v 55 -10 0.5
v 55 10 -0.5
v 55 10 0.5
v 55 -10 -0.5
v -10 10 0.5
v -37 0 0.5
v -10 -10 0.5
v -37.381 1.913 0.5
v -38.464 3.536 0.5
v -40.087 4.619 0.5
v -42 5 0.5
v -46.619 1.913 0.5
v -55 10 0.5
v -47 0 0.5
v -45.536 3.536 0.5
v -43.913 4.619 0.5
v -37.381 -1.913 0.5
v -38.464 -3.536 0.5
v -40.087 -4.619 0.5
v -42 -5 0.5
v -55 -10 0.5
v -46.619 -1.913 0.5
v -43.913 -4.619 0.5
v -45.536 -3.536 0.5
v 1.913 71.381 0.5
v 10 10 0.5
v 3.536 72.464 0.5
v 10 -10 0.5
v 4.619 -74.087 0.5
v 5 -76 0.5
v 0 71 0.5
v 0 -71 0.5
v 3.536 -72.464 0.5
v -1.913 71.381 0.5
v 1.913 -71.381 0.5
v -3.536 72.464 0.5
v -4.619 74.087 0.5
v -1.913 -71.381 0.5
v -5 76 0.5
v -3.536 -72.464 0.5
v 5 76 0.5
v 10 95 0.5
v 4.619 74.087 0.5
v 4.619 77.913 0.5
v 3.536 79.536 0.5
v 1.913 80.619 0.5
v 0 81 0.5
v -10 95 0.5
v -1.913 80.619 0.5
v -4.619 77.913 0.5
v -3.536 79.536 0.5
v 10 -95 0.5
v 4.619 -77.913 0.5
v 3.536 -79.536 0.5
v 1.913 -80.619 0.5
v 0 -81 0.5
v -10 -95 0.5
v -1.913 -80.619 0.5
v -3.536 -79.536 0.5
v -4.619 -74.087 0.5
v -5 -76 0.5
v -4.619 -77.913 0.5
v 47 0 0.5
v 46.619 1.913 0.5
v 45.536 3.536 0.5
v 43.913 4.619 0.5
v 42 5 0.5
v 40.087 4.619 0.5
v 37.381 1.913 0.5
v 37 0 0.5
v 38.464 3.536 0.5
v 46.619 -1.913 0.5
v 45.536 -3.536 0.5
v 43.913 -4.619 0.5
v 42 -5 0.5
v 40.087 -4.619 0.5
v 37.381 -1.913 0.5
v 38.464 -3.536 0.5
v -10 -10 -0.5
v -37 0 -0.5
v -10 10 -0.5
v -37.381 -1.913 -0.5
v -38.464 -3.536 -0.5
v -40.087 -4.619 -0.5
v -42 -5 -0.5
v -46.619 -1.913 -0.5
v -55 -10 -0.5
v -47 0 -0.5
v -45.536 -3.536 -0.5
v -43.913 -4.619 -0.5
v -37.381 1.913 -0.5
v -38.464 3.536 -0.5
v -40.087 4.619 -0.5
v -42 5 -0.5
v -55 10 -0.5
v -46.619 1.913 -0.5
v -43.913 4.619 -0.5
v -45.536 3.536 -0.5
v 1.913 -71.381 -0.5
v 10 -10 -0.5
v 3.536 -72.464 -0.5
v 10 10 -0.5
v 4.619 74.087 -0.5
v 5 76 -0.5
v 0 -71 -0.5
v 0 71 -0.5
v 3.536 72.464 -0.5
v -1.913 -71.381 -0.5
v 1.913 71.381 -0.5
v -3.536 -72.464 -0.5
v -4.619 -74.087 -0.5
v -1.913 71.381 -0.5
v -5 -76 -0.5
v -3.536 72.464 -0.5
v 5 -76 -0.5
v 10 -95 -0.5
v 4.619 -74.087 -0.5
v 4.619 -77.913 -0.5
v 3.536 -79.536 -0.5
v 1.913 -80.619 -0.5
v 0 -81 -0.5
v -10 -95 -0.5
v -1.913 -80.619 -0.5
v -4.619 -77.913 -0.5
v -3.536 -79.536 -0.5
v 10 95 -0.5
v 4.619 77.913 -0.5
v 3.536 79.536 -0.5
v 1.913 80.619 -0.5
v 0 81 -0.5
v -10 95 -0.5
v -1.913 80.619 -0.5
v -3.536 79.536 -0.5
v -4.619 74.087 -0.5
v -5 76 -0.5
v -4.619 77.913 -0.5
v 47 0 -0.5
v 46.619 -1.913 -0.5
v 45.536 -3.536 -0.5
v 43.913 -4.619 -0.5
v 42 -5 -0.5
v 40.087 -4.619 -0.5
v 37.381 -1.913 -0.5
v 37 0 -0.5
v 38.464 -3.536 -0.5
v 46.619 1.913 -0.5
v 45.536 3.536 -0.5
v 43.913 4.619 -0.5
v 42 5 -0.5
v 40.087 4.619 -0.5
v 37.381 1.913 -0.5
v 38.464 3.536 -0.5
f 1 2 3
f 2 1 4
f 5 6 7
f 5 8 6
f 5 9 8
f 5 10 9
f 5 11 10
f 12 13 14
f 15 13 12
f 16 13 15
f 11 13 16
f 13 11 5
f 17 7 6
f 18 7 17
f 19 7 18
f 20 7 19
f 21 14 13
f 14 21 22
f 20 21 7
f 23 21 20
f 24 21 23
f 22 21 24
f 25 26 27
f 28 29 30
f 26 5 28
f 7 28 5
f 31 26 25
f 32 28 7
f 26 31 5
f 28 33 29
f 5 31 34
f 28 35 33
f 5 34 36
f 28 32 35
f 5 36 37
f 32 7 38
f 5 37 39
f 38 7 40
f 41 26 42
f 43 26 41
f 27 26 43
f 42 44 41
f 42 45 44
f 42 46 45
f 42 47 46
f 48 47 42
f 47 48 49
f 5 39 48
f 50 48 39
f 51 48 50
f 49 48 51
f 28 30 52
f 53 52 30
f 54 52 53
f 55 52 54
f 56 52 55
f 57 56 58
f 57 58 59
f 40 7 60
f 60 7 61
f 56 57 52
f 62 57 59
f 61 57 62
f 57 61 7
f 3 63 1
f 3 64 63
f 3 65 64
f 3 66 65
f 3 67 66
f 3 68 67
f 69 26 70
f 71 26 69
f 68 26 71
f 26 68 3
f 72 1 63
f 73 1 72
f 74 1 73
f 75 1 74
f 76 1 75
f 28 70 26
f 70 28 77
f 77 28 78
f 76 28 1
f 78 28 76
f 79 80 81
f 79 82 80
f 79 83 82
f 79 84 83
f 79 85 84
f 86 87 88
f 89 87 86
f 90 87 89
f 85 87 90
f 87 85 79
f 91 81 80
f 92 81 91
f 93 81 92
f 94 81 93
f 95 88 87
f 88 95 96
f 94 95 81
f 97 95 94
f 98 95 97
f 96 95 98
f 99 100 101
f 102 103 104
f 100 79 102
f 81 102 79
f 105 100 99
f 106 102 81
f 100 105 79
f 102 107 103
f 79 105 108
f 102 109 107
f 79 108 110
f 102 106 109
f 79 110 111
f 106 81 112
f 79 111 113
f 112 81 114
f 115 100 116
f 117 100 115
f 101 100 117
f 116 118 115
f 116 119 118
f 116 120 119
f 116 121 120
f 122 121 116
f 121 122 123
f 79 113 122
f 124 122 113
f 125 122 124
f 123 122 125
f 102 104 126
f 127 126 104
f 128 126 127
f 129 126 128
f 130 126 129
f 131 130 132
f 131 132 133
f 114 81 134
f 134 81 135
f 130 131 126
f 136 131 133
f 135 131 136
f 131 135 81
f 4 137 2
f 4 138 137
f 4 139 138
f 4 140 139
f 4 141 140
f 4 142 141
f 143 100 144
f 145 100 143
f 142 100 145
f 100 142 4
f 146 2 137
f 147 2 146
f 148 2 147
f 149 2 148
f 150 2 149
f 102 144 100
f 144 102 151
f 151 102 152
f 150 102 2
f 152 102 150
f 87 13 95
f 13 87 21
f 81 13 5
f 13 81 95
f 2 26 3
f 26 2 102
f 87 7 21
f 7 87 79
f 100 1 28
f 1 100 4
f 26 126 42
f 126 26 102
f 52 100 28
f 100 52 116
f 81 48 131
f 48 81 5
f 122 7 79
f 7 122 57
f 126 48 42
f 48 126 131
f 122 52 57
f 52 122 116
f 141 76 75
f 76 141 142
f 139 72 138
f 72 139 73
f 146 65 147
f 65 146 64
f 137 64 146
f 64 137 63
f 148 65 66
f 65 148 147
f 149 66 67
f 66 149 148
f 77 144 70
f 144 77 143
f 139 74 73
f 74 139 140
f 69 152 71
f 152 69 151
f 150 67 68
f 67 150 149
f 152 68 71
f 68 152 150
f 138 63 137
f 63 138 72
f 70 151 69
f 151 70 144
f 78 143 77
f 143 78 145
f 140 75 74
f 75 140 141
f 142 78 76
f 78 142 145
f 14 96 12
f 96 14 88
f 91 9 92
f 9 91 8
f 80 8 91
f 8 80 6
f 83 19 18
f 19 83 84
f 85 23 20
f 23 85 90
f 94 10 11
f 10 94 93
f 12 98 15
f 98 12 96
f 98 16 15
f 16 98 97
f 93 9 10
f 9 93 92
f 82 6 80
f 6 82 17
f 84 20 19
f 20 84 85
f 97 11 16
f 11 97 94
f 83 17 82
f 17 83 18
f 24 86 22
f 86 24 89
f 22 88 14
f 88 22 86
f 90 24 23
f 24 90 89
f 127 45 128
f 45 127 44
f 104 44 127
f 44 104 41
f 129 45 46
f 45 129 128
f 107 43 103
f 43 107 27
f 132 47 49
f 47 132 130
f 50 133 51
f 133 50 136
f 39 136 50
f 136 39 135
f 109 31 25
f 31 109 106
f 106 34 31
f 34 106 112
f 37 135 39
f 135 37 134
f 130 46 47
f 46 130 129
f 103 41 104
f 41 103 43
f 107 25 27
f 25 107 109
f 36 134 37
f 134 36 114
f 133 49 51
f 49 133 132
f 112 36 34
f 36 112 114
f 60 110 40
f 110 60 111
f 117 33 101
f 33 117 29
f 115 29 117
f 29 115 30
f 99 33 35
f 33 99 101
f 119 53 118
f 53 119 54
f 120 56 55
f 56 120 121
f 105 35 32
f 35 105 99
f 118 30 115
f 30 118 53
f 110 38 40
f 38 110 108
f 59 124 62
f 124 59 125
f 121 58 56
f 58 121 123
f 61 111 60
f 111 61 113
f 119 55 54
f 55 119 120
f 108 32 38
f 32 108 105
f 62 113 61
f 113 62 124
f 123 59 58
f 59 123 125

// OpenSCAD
// file: ../../../../../shapes/oval/oval.scad
module oval(height = 3,
			radius = 20,
            xScale = 1.2,
            yScale = 1.4,
			fn = 30)
{
	$fn = fn;
	
    scale (v=[xScale, yScale, 1])
    cylinder(h = height, r=radius);
}
// file: ../massimo-buck-450-triangle-reflector-mount.scad
use <../../../../shapes/oval/oval.scad>


module triantleReflectorMount()
{
   difference()
    {
        height = 1;
        color("blue")
        // oval(height = height,
		// 	radius = 80,
        //     xScale = 1.2,
        //     yScale = 1.4);

        union()
        {   
            cube(size = [110, 20, height], center = true);

            translate([0, 0, 0])
            cube(size = [20, 190, height], center = true);
        }

        horizontalCutouts();
    
        verticleCutouts();
    }

    module horizontalCutouts()
    {
        translate = 42;

        translate([translate, 0, 0])
        cylinder(h = 6, r = 5, center = true);

        translate([-translate, 0,0])
        cylinder(h = 6, r = 5, center = true);
    }   

    module verticleCutouts()
    {
        translate = 76;

        translate([0, translate, 0])
        cylinder(h = 6, r = 5, center = true);

        translate([0, -translate, 0])
        cylinder(h = 6, r = 5, center = true);
    }   
}
// main file
use <../massimo-buck-450-triangle-reflector-mount.scad>;

triantleReflectorMount();
